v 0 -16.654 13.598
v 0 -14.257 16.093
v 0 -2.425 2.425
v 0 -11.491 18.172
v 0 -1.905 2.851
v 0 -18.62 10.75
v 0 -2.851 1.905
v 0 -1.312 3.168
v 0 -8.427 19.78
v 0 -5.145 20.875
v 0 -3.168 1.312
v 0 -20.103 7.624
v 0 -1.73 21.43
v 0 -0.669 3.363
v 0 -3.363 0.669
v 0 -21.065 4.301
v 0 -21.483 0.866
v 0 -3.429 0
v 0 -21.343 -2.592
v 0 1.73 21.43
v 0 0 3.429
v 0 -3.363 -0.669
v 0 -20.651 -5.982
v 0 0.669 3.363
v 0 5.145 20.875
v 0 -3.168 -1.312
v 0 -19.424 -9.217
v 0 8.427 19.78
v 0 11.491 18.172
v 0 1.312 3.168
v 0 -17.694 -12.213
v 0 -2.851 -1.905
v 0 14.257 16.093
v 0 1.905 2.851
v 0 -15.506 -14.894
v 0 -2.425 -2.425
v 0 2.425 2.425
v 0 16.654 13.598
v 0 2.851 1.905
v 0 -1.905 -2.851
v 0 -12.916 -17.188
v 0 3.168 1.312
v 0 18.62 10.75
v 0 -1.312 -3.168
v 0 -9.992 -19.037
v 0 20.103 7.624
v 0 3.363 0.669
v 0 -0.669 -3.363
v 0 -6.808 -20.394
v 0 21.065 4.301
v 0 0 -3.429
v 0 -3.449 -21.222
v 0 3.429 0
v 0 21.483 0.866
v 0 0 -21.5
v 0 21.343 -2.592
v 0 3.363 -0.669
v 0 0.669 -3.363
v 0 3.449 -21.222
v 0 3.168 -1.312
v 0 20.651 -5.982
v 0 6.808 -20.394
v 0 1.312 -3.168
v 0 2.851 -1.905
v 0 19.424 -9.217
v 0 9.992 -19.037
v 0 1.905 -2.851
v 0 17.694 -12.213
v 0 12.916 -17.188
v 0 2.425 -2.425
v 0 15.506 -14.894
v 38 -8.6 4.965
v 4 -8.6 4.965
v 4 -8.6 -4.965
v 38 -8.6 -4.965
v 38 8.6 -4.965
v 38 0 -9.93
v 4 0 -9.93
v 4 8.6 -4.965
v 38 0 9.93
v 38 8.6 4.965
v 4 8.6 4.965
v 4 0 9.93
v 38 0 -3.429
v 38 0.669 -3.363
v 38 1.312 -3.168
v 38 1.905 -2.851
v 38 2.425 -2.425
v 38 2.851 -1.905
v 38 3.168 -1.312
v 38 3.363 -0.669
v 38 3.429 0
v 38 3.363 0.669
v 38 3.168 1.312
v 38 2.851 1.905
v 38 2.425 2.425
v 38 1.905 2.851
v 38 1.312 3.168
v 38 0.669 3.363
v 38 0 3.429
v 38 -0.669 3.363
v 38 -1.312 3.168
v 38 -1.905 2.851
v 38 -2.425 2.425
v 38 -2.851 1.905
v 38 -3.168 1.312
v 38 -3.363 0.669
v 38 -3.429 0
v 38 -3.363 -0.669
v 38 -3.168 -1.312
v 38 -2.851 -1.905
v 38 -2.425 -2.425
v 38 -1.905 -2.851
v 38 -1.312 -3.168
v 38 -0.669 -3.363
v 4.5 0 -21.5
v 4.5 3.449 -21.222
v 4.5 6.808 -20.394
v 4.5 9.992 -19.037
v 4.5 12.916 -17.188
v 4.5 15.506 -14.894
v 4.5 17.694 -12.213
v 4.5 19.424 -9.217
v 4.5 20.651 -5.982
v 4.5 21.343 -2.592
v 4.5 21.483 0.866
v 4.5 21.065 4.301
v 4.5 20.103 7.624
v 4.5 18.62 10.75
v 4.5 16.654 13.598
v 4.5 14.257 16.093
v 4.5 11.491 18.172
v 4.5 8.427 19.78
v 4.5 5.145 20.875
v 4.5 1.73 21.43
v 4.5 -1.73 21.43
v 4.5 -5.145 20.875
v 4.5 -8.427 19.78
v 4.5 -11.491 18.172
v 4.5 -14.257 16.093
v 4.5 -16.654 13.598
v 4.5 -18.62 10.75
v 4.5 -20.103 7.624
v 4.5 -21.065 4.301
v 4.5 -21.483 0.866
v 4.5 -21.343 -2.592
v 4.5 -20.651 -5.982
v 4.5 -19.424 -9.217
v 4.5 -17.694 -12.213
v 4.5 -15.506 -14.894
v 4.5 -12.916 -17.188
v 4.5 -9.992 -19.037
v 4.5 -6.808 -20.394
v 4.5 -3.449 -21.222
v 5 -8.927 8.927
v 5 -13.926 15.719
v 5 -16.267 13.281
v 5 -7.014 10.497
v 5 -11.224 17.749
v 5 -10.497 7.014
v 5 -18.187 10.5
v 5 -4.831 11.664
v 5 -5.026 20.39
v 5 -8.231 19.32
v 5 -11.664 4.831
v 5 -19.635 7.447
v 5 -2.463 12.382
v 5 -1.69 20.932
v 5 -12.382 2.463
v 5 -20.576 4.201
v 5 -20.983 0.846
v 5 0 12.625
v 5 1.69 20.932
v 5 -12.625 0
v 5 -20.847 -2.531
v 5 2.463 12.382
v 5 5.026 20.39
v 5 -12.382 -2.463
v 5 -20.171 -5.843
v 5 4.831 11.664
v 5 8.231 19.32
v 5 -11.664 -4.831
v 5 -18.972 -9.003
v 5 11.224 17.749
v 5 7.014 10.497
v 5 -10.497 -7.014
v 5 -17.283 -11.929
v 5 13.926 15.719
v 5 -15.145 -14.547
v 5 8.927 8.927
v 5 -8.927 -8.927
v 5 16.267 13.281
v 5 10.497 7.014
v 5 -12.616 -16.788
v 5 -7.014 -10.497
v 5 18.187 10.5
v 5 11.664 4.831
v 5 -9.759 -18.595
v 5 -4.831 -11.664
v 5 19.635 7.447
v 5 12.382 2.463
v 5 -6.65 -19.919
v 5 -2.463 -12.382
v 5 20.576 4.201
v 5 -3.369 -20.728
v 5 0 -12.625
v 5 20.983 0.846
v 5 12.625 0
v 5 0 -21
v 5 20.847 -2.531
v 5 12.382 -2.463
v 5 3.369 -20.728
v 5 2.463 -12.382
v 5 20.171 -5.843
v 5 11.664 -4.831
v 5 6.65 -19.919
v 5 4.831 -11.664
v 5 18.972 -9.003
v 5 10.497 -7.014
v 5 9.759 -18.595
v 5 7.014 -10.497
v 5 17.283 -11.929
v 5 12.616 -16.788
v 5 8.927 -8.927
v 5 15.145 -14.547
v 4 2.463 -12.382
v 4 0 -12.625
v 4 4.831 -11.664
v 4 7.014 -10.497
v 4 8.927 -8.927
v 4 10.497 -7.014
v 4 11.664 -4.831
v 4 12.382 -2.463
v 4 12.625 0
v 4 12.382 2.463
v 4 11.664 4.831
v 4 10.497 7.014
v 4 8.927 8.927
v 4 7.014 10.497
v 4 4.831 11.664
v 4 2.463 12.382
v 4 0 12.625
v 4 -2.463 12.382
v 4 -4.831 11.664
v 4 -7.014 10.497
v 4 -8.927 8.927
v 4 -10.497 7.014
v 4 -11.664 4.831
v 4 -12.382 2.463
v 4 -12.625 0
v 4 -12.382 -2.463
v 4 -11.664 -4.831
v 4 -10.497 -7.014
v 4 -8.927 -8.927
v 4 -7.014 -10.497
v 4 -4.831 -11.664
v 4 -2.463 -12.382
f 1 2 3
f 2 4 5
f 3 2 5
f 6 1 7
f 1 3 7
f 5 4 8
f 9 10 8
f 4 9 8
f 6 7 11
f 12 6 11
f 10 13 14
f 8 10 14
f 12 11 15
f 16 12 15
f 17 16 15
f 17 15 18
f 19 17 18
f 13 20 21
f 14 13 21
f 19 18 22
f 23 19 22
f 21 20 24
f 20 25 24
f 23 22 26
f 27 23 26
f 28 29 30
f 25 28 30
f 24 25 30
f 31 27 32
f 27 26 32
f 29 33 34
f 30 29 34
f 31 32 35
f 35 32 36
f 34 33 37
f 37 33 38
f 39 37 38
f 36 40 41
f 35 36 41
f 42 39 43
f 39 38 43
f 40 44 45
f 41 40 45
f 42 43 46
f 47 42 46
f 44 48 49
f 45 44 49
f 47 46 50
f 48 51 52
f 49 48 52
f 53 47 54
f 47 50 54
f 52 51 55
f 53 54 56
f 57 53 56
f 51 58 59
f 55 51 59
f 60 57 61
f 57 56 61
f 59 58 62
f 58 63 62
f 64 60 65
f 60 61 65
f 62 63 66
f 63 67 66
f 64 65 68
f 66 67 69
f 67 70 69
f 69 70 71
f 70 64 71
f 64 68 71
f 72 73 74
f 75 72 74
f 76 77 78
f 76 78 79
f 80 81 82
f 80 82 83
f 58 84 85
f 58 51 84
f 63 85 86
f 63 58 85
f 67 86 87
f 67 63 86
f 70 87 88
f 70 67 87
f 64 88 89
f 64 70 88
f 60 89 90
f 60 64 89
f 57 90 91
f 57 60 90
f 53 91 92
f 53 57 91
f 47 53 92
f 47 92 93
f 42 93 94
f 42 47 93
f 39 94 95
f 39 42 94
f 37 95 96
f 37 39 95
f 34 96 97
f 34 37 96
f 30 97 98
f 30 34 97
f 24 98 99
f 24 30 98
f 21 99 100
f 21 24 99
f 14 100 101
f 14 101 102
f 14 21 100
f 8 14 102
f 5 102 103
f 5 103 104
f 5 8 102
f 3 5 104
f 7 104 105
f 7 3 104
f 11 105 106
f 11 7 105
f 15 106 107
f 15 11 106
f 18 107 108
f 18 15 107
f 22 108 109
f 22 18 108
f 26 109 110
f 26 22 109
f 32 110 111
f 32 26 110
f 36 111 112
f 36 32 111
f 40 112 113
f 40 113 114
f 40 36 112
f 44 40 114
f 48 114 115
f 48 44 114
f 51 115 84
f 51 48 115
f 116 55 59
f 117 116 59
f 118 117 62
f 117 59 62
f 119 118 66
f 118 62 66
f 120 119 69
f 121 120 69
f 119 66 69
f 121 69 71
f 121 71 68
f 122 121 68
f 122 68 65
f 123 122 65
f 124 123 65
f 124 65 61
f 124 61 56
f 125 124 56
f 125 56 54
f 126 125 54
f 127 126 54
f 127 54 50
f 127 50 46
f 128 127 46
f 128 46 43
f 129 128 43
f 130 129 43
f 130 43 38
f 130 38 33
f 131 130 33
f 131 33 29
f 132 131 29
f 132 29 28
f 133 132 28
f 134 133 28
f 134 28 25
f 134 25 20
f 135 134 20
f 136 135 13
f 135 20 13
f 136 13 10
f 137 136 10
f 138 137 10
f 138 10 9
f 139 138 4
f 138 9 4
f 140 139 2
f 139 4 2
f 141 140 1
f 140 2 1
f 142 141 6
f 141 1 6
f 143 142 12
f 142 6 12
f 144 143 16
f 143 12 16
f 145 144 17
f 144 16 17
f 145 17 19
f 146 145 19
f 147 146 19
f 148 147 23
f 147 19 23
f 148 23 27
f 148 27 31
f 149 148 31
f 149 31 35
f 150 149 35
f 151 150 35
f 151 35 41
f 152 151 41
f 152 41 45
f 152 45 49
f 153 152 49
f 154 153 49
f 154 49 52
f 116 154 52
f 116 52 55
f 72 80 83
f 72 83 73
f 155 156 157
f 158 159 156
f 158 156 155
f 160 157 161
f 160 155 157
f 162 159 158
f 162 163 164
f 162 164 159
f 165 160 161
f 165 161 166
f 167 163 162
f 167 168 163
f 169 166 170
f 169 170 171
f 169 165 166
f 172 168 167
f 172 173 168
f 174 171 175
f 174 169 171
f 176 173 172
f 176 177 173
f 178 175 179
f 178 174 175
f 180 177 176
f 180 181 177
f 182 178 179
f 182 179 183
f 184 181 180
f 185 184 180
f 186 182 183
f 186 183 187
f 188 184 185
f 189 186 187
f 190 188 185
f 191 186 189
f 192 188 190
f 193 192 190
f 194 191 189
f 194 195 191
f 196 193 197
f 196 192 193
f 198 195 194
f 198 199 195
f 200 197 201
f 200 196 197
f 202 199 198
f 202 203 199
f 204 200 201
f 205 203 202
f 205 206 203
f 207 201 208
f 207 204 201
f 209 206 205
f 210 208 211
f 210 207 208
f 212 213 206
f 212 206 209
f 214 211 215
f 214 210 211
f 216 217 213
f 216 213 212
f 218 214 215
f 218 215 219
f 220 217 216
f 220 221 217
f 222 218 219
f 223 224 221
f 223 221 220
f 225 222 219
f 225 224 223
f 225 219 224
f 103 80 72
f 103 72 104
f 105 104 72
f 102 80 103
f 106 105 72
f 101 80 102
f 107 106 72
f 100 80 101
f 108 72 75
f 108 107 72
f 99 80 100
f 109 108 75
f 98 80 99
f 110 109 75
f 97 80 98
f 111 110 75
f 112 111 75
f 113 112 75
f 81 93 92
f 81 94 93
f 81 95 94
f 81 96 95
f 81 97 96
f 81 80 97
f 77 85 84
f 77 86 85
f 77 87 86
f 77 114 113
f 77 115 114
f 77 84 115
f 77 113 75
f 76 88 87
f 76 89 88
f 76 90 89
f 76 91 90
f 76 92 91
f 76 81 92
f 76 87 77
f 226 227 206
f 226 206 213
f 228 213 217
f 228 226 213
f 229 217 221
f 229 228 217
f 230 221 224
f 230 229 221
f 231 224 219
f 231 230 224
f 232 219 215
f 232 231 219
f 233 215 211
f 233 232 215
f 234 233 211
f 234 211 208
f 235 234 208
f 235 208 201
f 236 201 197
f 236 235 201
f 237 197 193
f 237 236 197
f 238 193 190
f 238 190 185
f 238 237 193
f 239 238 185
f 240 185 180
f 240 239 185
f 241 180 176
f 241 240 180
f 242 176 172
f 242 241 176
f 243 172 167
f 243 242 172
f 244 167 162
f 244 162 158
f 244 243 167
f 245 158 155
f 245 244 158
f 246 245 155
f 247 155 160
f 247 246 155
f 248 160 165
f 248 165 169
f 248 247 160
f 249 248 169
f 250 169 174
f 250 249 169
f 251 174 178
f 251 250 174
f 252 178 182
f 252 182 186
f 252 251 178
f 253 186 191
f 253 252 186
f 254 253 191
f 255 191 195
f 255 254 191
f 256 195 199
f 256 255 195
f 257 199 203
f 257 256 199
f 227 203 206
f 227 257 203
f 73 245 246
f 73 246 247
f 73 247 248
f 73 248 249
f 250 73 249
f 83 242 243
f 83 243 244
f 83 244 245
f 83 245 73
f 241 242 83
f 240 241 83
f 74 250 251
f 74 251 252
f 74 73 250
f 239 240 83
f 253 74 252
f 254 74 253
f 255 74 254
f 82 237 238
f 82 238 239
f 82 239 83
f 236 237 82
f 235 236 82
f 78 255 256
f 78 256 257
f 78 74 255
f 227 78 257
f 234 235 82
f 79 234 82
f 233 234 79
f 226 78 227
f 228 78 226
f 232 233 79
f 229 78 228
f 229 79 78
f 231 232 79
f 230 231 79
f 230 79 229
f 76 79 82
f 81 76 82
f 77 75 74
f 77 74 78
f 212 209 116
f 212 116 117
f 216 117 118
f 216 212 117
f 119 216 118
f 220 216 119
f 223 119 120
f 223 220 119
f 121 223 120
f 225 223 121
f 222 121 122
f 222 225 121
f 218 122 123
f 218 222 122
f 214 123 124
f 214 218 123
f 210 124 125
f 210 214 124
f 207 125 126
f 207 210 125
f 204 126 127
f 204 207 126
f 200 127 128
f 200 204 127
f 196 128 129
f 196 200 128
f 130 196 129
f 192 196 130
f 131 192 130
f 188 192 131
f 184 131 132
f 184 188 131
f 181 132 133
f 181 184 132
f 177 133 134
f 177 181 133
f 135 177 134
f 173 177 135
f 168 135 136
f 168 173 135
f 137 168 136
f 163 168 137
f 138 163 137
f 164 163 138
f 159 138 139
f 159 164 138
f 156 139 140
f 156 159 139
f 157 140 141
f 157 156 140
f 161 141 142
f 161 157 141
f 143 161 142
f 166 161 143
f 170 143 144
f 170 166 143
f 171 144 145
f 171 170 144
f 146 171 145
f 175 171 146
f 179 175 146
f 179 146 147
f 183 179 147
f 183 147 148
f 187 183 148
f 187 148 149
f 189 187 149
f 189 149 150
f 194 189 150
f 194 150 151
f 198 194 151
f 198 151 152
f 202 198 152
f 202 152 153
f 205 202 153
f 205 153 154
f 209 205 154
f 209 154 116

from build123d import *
from build123d.topology import SkipClean

# Parameters (mm, degrees)
SKETCH1_R               = 21.5
BOSS_EXTRUDE1_DEPTH     = 4
SKETCH2_R               = 21.5
SKETCH2_R_2             = 12.625
BOSS_EXTRUDE2_DEPTH     = 1
CUT_EXTRUDE1_DEPTH      = 31.813957876
CUT_EXTRUDE1_DEPTH_BACK = 31.813957876
SKETCH3_R               = 3.429
SKETCH4_R               = 3.429
BOSS_EXTRUDE3_DEPTH     = 34
CHAMFER1_SIZE           = 0.5


with BuildPart() as part:
    # Sketch1 → Boss-Extrude1 (new body)
    with BuildSketch(Plane(origin=(0, 0, 0), x_dir=(0, 0, -1), z_dir=(1, 0, 0))):
        Circle(SKETCH1_R)
    extrude(amount=BOSS_EXTRUDE1_DEPTH)

    # Sketch2 → Boss-Extrude2 (add)
    with BuildSketch(Plane(origin=(4, 0, 0), x_dir=(0, 0, -1), z_dir=(1, 0, 0))):
        Circle(SKETCH2_R)
        Circle(SKETCH2_R_2, mode=Mode.SUBTRACT)
    extrude(amount=BOSS_EXTRUDE2_DEPTH)

    # Sketch3 → Cut-Extrude1 (cut, two sides: drawn at the far end of the back side and taken through both)
    with BuildSketch(Plane.ZY.offset(-CUT_EXTRUDE1_DEPTH_BACK)):
        Circle(SKETCH3_R)
    extrude(amount=CUT_EXTRUDE1_DEPTH + CUT_EXTRUDE1_DEPTH_BACK, mode=Mode.SUBTRACT)

    # Sketch4 → Boss-Extrude3 (add)
    with SkipClean():  # the faces are left unmerged after this step: merging them gives an invalid solid
        with BuildSketch(Plane(origin=(4, 0, 0), x_dir=(0, 0, -1), z_dir=(1, 0, 0))):
            Polygon((4.965212315, -8.6), (9.93042463, 0), (4.965212315, 8.6), (-4.965212315, 8.6), (-9.93042463, 0), (-4.965212315, -8.6), align=None)
            Circle(SKETCH4_R, mode=Mode.SUBTRACT)
        extrude(amount=BOSS_EXTRUDE3_DEPTH)

    # Chamfer1
    chamfer1_edges = [part.edges().sort_by_distance(p)[0] for p in [
        (5, 0, 21.5),
    ]]
    chamfer(chamfer1_edges, length=CHAMFER1_SIZE)


solid = part.part
